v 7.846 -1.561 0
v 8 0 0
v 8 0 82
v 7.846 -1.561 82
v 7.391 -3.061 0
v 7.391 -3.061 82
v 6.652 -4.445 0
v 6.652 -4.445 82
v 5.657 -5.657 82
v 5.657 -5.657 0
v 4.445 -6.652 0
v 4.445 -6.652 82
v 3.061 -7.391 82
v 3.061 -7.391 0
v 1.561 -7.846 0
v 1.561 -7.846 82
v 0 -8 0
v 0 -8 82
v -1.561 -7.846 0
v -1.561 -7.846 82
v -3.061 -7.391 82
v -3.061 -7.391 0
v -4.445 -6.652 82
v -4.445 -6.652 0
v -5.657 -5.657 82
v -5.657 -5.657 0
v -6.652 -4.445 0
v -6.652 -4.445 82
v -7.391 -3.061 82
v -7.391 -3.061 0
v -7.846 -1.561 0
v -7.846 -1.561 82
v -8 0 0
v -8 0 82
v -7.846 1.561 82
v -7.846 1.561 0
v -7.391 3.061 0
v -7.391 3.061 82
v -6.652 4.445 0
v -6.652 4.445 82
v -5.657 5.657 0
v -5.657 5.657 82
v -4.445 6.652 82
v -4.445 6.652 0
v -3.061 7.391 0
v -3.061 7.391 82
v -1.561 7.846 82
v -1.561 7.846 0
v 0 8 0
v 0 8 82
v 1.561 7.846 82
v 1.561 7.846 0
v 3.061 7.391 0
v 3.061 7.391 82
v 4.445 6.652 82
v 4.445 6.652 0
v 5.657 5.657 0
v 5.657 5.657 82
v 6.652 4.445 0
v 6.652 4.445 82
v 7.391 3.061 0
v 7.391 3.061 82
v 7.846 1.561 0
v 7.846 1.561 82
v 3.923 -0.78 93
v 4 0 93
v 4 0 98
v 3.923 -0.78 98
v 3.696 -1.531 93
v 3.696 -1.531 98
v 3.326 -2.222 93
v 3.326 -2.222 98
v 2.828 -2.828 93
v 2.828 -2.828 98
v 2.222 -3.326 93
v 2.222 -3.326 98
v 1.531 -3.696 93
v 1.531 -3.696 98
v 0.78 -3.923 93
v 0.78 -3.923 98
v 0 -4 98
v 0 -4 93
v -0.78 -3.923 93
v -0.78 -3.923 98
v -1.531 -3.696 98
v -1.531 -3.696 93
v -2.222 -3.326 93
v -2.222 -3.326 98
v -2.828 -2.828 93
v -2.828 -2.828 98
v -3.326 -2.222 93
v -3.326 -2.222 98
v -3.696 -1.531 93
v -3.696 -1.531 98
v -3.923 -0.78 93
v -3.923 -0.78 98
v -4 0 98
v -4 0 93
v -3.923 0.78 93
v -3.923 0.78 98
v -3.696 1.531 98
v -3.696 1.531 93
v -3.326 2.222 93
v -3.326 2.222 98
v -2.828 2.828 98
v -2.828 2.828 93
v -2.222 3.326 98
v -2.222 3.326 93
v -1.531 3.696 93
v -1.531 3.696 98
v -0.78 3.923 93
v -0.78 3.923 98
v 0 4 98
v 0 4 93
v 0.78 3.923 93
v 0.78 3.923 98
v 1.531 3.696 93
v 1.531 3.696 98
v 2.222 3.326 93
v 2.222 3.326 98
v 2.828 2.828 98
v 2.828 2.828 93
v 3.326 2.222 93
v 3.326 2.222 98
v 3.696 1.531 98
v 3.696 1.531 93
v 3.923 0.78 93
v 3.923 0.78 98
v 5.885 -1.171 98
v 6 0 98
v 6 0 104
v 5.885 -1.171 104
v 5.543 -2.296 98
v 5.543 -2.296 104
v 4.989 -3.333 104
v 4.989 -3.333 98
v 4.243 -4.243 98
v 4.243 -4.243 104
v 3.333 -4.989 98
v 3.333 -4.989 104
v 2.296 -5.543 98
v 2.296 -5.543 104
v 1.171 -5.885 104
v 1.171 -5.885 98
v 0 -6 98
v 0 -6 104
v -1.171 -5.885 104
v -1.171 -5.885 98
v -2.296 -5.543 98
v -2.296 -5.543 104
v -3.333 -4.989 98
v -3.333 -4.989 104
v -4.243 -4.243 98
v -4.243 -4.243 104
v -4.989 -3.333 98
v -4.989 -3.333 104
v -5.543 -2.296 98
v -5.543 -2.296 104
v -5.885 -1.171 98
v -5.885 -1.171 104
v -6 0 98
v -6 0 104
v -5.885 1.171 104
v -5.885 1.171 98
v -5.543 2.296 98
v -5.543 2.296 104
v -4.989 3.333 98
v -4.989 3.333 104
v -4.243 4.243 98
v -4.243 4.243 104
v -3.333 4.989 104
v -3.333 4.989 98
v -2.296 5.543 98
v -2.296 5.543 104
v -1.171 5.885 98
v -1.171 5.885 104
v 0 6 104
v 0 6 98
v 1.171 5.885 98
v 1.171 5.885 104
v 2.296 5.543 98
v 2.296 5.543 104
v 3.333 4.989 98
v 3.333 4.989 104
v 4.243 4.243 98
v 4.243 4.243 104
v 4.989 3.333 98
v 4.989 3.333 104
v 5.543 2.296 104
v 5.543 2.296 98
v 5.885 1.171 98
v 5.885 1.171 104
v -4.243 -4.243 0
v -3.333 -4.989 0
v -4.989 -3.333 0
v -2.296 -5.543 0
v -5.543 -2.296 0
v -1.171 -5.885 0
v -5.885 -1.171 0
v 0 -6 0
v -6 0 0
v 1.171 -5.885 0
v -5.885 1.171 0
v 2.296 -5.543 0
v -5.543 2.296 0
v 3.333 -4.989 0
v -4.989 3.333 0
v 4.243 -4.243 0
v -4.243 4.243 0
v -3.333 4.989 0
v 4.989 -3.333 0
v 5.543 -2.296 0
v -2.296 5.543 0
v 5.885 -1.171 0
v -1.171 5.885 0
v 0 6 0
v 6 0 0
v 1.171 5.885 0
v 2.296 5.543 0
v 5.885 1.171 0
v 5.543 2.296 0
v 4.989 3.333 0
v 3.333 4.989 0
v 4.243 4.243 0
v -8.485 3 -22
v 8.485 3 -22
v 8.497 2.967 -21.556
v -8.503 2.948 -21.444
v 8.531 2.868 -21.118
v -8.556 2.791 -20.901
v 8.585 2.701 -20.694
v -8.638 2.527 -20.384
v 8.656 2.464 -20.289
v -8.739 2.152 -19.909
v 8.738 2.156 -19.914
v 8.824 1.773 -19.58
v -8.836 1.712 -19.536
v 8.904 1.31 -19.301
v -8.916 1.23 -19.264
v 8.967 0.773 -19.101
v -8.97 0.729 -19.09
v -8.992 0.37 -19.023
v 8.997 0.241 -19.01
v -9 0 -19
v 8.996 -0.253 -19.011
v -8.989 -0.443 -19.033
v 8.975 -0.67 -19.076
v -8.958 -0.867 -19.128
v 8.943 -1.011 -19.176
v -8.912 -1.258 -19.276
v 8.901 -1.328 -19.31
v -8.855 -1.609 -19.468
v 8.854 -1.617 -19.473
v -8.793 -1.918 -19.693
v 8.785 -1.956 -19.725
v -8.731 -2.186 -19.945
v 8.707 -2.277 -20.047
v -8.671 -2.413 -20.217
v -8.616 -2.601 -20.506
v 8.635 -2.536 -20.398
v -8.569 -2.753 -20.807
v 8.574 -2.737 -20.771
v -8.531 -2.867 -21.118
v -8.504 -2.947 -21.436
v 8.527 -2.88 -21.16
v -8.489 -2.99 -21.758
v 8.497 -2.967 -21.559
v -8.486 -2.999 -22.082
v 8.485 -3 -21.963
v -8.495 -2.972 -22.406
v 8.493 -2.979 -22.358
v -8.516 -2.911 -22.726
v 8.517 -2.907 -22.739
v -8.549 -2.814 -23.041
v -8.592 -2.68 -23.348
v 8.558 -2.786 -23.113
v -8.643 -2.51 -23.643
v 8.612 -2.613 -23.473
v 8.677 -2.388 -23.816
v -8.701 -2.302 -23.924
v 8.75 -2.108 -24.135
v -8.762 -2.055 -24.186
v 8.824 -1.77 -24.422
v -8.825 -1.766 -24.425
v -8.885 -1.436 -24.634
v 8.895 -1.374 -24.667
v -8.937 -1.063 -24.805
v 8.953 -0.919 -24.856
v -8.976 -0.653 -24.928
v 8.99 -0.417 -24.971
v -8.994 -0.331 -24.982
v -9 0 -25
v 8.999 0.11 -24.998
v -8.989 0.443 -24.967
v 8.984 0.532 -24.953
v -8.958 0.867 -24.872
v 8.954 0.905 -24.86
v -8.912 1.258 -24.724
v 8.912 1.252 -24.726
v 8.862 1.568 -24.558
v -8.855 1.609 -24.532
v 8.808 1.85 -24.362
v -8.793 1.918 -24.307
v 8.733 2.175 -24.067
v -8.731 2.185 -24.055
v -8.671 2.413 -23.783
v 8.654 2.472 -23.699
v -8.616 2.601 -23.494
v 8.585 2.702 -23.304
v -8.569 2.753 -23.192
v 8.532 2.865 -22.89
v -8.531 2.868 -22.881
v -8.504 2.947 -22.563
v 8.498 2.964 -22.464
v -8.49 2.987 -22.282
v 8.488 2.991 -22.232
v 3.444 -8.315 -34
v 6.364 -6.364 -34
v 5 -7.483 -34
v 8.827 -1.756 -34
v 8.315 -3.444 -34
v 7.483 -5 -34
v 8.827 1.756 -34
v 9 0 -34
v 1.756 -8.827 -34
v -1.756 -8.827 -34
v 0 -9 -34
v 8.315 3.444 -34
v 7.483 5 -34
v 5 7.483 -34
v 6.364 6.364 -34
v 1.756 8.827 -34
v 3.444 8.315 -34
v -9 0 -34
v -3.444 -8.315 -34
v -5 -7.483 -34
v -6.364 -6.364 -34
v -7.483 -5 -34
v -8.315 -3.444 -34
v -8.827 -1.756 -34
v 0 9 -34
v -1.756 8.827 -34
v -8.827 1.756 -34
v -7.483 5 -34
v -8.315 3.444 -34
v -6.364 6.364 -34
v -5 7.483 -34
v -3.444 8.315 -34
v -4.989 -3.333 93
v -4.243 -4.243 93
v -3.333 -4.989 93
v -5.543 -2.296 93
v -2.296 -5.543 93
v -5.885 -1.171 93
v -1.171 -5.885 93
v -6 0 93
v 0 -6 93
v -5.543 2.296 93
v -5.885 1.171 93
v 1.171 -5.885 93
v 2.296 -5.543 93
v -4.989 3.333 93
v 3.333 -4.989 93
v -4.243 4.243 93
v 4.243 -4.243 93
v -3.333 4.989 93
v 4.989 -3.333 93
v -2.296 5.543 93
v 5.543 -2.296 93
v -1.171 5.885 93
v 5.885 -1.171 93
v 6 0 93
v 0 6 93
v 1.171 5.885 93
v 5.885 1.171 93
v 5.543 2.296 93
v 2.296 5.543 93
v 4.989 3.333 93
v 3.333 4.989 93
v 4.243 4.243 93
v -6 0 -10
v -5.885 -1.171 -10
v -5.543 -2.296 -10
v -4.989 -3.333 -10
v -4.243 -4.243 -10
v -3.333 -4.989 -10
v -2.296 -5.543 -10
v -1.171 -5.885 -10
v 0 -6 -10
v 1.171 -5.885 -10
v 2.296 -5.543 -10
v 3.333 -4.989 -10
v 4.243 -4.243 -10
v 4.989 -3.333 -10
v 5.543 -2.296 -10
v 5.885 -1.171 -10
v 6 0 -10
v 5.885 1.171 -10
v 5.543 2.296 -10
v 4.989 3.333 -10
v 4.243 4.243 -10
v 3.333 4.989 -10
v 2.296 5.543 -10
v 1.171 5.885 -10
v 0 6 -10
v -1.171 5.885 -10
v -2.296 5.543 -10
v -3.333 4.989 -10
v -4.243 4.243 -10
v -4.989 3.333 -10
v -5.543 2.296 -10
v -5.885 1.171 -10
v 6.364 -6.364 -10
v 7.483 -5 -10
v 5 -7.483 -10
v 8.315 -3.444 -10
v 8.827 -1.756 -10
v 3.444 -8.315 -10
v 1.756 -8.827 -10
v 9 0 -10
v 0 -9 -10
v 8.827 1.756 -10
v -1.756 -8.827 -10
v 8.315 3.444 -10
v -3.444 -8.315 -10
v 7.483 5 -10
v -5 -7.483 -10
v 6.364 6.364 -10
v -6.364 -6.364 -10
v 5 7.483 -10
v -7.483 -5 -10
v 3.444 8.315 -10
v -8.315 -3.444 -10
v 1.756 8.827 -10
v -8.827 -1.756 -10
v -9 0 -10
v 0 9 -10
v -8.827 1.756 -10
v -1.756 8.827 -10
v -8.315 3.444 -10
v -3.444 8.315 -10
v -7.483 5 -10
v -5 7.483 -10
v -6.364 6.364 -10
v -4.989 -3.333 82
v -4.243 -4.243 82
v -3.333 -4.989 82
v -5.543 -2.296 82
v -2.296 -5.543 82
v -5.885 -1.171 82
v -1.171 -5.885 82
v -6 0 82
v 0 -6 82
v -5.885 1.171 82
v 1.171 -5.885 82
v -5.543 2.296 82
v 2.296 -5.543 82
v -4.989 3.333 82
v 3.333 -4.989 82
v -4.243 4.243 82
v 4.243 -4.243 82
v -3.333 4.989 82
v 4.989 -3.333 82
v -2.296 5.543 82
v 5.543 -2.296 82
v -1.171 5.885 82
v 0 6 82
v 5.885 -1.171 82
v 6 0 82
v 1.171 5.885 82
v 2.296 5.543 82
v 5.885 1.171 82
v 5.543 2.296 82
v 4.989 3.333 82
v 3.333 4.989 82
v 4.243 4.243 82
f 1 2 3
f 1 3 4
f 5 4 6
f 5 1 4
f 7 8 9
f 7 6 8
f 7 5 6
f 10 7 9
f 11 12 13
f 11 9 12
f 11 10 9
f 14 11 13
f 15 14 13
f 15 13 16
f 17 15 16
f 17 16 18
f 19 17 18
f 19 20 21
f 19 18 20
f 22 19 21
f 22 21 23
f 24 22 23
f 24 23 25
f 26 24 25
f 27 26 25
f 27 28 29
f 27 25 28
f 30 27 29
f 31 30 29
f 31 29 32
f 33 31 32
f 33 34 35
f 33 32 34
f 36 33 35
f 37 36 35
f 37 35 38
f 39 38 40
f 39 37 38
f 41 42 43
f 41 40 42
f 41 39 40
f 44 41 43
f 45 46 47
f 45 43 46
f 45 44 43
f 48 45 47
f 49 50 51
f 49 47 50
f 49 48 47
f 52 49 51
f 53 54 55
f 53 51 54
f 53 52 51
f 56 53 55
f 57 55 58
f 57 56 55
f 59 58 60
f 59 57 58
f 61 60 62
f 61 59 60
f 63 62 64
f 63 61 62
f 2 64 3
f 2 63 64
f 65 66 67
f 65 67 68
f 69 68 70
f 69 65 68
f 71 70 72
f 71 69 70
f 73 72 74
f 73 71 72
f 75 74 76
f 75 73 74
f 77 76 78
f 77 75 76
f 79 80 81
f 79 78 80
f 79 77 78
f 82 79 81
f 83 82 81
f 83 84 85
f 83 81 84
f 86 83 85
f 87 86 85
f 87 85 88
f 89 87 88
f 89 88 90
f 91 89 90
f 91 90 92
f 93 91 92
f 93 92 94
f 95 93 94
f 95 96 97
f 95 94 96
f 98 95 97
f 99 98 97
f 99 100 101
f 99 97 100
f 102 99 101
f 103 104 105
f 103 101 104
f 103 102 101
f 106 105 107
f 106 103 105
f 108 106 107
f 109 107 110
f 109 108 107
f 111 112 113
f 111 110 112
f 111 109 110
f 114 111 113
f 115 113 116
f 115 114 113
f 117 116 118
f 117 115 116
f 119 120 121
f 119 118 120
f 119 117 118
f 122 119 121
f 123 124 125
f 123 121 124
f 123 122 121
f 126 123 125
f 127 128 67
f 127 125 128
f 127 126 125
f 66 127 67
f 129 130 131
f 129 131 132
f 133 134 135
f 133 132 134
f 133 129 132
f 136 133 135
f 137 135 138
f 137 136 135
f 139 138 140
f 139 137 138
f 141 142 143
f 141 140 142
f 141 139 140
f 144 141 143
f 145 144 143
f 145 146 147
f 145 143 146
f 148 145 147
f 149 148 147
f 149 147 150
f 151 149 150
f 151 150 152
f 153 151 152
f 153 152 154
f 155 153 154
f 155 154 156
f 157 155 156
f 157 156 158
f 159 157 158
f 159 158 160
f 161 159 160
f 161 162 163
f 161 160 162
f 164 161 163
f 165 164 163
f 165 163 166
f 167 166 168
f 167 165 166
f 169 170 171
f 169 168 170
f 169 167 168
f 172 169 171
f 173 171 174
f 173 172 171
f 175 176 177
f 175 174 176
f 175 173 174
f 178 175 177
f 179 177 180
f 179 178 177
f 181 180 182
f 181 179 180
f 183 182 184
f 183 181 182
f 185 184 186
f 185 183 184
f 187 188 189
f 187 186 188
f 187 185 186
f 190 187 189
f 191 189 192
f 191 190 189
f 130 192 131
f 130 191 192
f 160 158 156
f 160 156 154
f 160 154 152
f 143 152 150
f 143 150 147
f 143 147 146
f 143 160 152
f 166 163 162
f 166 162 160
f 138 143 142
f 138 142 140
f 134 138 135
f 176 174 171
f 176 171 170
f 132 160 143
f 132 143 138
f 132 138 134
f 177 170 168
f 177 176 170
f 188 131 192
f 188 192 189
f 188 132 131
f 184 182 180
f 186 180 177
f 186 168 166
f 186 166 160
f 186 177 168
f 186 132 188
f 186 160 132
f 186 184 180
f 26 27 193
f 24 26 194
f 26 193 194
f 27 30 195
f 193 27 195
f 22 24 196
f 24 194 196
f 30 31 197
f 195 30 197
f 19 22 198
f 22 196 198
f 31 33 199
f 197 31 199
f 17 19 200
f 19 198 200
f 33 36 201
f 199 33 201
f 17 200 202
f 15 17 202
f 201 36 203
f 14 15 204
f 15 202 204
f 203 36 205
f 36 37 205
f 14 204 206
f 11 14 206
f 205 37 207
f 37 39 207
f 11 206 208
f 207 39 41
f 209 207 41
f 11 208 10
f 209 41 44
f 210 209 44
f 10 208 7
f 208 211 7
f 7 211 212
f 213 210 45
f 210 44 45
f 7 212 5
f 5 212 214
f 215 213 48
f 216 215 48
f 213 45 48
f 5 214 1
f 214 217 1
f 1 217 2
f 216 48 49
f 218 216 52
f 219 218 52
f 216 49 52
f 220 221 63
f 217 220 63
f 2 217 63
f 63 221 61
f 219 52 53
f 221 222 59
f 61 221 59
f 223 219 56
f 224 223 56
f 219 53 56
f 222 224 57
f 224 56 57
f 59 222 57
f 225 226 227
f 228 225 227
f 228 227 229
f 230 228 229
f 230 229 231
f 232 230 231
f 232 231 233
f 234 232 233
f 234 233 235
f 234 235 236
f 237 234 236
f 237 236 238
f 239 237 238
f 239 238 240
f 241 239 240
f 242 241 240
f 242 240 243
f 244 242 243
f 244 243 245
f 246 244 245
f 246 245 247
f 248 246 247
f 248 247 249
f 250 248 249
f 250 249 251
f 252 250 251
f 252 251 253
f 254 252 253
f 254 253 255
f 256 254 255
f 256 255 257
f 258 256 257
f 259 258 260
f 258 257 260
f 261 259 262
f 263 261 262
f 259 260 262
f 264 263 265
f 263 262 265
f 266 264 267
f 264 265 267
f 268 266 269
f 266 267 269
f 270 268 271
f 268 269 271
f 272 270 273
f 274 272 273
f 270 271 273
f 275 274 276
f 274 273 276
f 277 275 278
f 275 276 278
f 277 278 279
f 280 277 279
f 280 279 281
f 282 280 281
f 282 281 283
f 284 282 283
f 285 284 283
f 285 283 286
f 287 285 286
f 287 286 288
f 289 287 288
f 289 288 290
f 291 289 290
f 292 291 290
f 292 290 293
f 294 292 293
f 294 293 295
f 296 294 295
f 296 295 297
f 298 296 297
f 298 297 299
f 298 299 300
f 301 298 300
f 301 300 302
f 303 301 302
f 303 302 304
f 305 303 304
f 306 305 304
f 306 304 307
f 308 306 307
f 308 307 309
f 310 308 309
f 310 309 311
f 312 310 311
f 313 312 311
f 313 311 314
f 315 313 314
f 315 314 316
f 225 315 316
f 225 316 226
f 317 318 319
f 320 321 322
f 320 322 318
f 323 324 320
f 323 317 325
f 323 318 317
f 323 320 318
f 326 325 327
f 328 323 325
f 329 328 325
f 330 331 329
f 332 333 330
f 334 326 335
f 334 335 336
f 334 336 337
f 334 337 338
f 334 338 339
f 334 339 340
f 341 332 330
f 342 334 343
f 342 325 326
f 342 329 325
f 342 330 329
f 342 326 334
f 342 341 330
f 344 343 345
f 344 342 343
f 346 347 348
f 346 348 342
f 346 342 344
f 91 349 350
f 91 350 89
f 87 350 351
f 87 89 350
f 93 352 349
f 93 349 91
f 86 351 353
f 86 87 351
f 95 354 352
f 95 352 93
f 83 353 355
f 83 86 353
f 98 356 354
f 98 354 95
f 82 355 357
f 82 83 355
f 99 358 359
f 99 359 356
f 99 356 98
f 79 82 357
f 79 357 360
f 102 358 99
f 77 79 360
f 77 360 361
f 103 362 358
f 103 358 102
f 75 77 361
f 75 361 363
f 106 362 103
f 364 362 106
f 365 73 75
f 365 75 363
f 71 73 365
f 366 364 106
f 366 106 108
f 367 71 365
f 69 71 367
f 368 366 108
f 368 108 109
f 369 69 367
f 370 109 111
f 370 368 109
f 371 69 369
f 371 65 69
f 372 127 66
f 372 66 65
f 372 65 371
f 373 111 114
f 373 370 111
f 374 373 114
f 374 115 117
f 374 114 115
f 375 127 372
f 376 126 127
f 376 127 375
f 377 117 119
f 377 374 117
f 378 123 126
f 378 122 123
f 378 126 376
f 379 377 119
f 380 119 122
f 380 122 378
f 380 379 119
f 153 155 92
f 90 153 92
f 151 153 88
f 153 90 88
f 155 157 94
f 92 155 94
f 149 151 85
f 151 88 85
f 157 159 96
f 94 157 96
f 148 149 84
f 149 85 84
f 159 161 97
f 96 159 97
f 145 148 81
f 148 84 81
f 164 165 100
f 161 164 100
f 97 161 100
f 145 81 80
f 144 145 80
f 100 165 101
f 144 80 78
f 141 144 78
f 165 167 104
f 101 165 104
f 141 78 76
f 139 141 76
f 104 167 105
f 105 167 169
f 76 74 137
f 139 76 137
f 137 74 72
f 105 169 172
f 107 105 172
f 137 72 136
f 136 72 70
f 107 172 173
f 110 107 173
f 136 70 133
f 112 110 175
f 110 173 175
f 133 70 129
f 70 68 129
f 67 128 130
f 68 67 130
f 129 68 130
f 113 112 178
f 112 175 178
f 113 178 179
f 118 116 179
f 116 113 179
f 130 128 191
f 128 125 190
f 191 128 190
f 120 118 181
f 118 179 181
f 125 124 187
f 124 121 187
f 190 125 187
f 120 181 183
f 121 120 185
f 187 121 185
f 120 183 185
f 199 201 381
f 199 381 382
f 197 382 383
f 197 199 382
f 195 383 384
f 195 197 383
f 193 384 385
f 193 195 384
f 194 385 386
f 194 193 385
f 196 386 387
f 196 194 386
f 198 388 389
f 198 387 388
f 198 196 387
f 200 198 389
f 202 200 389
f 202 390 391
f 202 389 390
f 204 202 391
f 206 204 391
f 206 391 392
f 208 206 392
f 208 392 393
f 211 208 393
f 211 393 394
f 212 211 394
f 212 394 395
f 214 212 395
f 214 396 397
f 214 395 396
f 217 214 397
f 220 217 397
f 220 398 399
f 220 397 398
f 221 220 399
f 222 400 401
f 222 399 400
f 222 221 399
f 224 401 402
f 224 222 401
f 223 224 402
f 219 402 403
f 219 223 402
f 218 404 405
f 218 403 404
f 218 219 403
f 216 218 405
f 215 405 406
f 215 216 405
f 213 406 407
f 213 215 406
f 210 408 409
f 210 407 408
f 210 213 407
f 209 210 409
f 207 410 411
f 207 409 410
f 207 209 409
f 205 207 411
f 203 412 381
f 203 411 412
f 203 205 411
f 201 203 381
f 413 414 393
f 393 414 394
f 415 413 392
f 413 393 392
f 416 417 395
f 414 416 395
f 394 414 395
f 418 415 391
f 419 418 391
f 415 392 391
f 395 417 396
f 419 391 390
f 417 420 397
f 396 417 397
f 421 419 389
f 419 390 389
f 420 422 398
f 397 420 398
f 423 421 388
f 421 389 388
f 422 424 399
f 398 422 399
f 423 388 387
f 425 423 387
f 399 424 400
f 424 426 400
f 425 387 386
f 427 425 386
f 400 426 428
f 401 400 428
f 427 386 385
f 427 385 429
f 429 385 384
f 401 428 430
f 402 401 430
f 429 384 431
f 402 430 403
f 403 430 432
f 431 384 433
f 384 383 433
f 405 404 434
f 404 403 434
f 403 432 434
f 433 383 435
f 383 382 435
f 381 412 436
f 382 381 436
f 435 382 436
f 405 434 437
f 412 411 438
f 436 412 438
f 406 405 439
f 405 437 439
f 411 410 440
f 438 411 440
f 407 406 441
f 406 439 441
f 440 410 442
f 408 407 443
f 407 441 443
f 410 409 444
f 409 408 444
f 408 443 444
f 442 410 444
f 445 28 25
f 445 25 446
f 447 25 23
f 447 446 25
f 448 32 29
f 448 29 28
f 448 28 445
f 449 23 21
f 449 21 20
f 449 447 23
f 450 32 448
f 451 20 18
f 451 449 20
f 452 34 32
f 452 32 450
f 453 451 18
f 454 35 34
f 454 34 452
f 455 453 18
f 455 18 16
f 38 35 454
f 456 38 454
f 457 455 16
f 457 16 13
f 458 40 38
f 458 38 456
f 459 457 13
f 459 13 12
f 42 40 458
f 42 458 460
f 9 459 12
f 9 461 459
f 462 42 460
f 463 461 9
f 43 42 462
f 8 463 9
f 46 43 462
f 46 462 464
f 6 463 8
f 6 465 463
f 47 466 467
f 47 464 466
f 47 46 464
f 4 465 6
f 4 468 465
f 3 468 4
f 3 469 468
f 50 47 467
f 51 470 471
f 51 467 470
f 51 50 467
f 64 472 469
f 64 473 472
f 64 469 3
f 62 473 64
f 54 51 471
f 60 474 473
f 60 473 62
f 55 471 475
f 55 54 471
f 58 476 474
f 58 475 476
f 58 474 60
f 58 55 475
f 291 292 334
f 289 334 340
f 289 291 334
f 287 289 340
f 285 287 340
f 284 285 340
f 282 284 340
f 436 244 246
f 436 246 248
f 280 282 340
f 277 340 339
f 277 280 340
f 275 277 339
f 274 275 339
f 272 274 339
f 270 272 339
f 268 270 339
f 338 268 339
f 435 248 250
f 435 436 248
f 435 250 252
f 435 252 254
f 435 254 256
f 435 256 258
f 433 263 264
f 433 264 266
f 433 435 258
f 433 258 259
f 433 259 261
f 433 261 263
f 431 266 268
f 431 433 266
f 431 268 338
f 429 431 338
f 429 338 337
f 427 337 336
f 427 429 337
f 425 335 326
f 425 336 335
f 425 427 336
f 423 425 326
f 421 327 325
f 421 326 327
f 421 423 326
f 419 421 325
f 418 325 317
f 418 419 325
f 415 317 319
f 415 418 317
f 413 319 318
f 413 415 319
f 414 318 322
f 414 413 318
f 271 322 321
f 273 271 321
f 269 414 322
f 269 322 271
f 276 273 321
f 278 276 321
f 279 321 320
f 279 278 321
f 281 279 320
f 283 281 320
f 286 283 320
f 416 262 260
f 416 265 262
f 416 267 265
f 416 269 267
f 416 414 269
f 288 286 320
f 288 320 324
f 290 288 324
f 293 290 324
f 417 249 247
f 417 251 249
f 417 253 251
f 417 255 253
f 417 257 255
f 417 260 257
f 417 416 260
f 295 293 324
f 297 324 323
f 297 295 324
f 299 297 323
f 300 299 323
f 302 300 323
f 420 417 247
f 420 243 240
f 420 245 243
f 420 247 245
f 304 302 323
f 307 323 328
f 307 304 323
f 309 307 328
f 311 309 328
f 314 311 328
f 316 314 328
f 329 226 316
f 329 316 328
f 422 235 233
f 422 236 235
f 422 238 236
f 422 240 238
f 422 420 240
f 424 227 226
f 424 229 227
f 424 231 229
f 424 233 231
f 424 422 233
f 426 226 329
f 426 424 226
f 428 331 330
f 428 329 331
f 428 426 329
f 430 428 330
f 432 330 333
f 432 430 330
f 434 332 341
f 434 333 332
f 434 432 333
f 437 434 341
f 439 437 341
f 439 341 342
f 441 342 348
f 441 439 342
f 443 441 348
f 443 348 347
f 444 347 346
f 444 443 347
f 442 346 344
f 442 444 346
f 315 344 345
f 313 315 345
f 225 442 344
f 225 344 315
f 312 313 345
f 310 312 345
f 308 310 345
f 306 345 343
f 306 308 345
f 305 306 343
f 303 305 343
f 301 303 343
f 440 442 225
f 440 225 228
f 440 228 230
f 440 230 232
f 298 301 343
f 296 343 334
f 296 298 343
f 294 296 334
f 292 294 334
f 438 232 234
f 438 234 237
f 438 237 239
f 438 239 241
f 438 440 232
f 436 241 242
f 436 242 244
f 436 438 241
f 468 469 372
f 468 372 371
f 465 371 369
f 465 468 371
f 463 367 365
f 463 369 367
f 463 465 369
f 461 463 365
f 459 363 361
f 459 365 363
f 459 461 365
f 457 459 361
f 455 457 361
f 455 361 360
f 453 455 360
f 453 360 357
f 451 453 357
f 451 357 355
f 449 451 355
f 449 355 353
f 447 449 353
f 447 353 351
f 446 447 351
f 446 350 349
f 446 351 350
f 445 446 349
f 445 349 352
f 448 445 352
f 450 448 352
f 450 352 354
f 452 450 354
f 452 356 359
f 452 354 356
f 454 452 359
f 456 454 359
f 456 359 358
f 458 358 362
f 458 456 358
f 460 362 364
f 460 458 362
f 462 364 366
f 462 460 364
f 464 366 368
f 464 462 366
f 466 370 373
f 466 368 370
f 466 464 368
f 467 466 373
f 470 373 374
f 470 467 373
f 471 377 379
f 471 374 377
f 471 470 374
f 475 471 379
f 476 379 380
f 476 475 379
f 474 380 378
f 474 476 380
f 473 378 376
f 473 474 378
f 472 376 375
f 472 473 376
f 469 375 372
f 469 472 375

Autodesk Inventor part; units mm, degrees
ref_plane "YZ Plane" through (0, 0, 0) normal (1, 0, 0) x (0, 1, 0)
ref_plane "XZ Plane" through (0, 0, 0) normal (0, 1, 0) x (-1, 0, 0)
ref_plane "XY Plane" through (0, 0, 0) normal (0, 0, 1) x (1, 0, 0)
sketch "Sketch1" plane through (0, 0, 0) normal (0, 0, 1) x (1, 0, 0)
  circle A0 centre (0, 0) radius 8
  dimension "d0" = 16
extrude "Extrusion1" add sketch "Sketch1" along normal blind 82
sketch "Sketch2" plane through (0, 0, 82) normal (0, 0, 1) x (1, 0, 0)
  circle A0 centre (0, 0) radius 6
  dimension "d4" = 12
extrude "Extrusion2" add sketch "Sketch2" along normal blind 11
sketch "Sketch3" plane through (0, 0, 93) normal (0, 0, 1) x (1, 0, 0)
  circle A0 centre (0, 0) radius 4
  dimension "d7" = 8
extrude "Extrusion3" add sketch "Sketch3" along normal blind 5
sketch "Sketch4" plane through (0, 0, 98) normal (0, 0, 1) x (1, 0, 0)
  circle A0 centre (0, 0) radius 6
  dimension "d10" = 12
extrude "Extrusion4" add sketch "Sketch4" along normal blind 6
sketch "Sketch5" plane through (0, 0, 0) normal (0, 0, -1) x (-1, 0, 0)
  circle A0 centre (0, 0) radius 6
  dimension "d13" = 12
extrude "Extrusion5" add sketch "Sketch5" along normal blind 10
sketch "Sketch6" plane through (0, 0, -10) normal (0, 0, -1) x (-1, 0, 0)
  circle A0 centre (0, 0) radius 9
  dimension "d16" = 18
extrude "Extrusion6" add sketch "Sketch6" along normal blind 24
sketch "Sketch7" plane through (0, 0, 0) normal (1, 0, 0) x (0, 1, 0)
  line L0 (-9, -10) -> (9, -10) projected
  line L1 (-9, -34) -> (9, -34) projected
  line L2 (-9, -10) -> (9, -34)
  line L3 (9, -10) -> (-9, -34)
  circle A0 centre (0, -22) radius 3
  point P0 (0, 0)
  dimension "d19" = 6
extrude "Extrusion7" cut sketch "Sketch7" against normal mid plane 24 contours A0 L3 L2 | L2 L3 A0 | A0 L2 L3 | L2 A0 L3
properties part number "09.TornilloSinFin.LPSM" material "Steel, Alloy"
